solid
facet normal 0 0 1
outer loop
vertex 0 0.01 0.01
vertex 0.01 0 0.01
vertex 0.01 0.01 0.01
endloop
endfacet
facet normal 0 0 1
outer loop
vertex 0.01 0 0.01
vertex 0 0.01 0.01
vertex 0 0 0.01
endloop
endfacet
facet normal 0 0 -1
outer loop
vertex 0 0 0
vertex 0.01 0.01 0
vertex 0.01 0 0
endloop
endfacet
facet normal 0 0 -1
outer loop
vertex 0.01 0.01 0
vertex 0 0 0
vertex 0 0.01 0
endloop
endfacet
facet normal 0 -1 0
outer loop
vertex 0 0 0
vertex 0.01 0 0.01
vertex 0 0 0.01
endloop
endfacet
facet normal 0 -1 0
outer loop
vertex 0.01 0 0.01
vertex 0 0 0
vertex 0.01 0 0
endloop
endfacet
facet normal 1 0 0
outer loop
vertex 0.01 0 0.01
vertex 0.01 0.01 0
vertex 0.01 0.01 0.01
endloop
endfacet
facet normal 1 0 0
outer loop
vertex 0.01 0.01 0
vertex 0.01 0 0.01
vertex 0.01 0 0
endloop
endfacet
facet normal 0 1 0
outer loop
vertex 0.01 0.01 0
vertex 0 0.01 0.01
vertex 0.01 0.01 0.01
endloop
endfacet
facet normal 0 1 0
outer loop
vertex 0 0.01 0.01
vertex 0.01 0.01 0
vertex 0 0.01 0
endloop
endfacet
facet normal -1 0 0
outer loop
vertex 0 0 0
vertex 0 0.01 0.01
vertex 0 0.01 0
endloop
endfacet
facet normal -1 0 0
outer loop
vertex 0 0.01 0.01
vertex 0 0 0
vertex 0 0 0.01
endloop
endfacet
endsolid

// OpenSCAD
/***
 * @function tanh_triad_solver_bounds
 * @brief Retain an exterior solver bracket when the corrective harmonic exceeds the crest estimate.
 * Source: [`tanh_triad/solver_bounds.scad`](tanh_triad/solver_bounds.scad)
 */
include <../../src/tanh_triad/mate.scad>
for(params=[[1.8,.13,.03],[.8,.32,0],[100,.49,.19],[.01,.01,.19]]) {
    shape=_cg_tanh_triad_shape(.8,34,params[0],params[1],params[2],720);
    mid=_cg_sample_polar_radii(shape[1],720,true);
    D=curve_gear_tanh_triad_centre_distance(.8,34,params[0],params[1],params[2],720);
    assert(D>max(mid),"Tanh distance intersects its driver");
    assert(abs(_cg_motion_closure_error_from_mid_radii(mid,D))<1e-6,"Tanh corrected bracket does not close");
}
cube(.01);
